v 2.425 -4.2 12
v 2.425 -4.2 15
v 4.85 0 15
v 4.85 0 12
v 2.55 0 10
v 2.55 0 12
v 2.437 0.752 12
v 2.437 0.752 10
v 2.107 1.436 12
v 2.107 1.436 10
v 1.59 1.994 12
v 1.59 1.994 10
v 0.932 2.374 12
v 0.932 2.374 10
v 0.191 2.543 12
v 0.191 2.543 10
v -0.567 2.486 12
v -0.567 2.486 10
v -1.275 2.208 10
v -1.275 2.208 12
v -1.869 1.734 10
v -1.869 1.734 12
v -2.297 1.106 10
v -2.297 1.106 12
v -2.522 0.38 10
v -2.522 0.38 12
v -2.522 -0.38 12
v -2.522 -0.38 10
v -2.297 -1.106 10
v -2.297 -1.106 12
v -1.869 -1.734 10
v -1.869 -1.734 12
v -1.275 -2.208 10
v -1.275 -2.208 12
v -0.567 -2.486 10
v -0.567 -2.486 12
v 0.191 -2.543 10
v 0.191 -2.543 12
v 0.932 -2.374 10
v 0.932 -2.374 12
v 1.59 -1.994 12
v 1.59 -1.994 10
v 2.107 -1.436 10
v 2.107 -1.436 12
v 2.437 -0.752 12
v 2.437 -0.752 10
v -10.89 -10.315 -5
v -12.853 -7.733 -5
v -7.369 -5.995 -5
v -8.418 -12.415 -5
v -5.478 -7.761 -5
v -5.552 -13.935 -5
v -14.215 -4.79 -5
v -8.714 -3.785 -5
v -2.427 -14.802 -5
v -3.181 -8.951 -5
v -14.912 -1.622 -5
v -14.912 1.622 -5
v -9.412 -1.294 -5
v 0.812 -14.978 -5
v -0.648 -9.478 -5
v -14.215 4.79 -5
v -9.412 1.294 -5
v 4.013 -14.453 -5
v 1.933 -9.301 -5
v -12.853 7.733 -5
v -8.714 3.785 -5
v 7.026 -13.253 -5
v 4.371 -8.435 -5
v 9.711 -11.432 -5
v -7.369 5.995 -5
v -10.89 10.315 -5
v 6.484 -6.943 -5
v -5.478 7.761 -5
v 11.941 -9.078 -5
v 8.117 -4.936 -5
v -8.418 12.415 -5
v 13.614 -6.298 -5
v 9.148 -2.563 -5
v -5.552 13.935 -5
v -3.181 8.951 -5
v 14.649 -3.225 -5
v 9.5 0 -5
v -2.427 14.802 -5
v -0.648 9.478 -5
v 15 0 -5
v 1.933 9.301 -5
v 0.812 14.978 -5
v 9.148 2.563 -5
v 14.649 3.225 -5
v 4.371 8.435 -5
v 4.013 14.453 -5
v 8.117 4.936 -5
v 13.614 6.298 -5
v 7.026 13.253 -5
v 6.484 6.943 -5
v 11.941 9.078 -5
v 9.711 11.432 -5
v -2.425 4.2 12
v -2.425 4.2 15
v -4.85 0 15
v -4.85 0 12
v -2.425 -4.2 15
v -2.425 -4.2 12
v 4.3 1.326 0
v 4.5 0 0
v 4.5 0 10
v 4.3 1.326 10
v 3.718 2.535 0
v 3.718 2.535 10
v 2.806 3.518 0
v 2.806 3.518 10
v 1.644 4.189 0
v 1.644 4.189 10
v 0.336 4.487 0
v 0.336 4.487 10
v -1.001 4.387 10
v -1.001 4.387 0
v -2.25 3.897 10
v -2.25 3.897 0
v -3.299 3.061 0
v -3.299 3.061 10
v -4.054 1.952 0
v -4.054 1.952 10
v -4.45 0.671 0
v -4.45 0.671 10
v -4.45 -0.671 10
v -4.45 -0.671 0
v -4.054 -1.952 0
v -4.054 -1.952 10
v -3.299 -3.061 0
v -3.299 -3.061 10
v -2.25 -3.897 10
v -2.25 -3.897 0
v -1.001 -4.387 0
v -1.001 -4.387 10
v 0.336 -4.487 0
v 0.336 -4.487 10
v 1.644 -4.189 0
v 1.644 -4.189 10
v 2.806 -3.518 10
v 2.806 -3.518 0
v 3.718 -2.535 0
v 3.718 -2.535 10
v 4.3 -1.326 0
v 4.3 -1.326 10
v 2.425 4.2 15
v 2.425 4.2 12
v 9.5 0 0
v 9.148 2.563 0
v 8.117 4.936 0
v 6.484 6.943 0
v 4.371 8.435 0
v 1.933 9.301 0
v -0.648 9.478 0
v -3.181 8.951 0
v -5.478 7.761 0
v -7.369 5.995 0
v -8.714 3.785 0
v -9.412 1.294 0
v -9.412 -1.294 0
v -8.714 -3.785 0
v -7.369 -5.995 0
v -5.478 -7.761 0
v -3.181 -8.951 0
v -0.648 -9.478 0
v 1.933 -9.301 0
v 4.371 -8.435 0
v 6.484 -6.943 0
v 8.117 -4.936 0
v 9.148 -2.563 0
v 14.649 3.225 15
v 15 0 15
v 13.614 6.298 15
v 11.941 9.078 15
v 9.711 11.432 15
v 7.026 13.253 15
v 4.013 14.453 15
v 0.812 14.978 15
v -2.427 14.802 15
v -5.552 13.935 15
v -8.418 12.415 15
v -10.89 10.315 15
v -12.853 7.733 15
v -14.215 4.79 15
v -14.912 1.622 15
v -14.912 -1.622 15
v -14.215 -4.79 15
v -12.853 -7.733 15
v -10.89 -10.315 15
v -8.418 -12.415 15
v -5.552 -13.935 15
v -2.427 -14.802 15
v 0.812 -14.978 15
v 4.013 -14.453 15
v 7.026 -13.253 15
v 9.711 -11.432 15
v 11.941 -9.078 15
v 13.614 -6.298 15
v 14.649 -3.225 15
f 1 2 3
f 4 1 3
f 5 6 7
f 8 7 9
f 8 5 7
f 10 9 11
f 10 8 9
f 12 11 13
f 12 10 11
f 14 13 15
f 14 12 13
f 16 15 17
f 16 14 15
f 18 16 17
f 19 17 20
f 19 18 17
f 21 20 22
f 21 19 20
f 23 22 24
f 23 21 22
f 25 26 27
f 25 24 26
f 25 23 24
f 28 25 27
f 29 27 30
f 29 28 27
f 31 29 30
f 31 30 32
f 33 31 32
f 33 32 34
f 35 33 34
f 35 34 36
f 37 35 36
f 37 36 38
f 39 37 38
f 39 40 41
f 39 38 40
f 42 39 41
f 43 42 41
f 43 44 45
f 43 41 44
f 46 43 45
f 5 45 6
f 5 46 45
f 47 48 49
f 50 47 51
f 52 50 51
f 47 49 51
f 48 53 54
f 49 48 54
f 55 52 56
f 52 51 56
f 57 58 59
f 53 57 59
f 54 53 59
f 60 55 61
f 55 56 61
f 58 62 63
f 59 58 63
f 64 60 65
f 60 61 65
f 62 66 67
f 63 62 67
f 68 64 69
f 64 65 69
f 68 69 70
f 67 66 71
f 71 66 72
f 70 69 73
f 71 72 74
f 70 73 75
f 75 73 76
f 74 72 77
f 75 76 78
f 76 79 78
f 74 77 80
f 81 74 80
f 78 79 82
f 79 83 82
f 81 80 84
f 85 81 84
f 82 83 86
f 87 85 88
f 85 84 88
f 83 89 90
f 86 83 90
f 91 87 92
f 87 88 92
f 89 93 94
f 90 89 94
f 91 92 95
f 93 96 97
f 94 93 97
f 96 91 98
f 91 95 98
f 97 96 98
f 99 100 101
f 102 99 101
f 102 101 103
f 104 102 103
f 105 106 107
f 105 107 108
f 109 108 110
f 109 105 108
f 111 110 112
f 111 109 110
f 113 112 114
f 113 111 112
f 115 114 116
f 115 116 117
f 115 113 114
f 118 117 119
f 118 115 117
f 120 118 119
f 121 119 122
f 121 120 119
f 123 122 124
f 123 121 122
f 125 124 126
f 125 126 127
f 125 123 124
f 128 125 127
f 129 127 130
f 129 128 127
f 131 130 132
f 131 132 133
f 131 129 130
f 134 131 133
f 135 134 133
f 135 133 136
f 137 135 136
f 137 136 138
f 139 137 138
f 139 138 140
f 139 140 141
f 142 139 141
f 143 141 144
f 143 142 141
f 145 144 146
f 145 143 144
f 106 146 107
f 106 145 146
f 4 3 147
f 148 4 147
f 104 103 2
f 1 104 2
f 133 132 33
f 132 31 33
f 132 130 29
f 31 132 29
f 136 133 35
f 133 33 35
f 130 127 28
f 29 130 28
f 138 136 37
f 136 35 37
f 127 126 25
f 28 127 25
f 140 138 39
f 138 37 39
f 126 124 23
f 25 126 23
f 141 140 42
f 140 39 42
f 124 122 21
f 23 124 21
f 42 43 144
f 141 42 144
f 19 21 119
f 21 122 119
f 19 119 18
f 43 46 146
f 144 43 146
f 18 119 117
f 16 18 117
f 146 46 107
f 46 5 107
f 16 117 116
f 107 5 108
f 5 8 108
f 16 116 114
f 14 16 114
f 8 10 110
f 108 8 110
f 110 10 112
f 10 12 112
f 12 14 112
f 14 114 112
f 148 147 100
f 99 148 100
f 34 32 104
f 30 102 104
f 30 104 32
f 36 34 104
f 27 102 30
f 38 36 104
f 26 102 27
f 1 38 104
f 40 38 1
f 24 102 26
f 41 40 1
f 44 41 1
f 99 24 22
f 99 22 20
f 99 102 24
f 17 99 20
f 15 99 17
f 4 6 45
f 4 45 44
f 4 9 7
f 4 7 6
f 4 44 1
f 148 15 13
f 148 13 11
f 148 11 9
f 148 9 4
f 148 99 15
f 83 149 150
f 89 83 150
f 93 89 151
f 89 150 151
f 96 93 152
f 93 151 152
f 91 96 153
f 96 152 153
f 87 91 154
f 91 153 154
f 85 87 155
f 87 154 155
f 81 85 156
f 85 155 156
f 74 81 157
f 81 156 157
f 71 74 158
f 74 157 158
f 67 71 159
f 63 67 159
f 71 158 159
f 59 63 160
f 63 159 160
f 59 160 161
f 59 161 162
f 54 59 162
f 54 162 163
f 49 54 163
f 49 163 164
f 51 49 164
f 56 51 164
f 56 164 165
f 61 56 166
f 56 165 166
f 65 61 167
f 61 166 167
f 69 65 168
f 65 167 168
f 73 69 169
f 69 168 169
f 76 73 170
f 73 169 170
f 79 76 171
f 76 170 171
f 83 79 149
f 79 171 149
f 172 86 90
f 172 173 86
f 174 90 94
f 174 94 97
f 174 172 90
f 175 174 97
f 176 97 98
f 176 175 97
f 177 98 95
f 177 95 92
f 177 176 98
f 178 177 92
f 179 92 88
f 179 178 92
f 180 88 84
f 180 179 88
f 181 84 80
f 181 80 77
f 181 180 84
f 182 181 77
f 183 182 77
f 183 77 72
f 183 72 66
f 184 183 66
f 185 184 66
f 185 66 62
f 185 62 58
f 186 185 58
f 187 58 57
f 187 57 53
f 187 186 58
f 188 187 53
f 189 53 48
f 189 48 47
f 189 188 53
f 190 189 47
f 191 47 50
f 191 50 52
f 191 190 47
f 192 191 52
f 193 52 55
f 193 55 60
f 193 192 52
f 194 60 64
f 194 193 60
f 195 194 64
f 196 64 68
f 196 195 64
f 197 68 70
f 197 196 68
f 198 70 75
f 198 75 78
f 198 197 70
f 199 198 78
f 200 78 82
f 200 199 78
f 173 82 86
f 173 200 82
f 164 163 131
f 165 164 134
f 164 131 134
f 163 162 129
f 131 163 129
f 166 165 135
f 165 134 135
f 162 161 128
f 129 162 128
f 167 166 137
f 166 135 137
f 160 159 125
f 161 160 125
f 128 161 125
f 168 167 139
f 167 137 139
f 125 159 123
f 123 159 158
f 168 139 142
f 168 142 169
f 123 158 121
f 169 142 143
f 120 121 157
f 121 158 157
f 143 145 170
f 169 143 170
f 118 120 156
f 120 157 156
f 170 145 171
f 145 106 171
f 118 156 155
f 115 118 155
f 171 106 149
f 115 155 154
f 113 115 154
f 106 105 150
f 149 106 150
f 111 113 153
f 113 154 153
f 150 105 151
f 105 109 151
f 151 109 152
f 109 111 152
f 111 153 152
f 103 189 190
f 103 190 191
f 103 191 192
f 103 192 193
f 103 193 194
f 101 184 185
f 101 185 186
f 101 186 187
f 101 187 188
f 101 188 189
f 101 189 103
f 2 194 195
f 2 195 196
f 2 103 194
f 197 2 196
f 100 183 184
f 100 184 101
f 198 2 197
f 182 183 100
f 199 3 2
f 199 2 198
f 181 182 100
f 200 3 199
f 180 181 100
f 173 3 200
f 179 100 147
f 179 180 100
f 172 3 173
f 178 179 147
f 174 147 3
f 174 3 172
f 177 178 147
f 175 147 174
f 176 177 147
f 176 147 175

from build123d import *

# Parameters (mm, degrees)
F0_R     = 15
F0_R_2   = 9.5
F0_R_3   = 4.5
F0_R_4   = 2.55
F1_DEPTH = 15
F3_DEPTH = 3
F4_DEPTH = 10
F5_DEPTH = 5


with BuildPart() as f1:
    # F0 (on Top) → F1 (new body)
    with BuildSketch(Plane.XY):
        Circle(F0_R)
        Circle(F0_R_2, mode=Mode.SUBTRACT)
        Circle(F0_R_2)
        Circle(F0_R_3, mode=Mode.SUBTRACT)
        Circle(F0_R_3)
        Circle(F0_R_4, mode=Mode.SUBTRACT)
    extrude(amount=F1_DEPTH)

    # F2 (on face) → F3 (cut)
    with BuildSketch(Plane.XY.offset(15)):
        Polygon((2.4248711306, -4.2), (4.8497422612, 0), (2.4248711306, 4.2), (-2.4248711306, 4.2), (-4.8497422612, 0), (-2.4248711306, -4.2), align=None)
    extrude(amount=-F3_DEPTH, mode=Mode.SUBTRACT)

    # F0 (on Top) → F4 (cut)
    with BuildSketch(Plane.XY):
        Circle(F0_R_3)
        Circle(F0_R_4, mode=Mode.SUBTRACT)
    extrude(amount=F4_DEPTH, mode=Mode.SUBTRACT)

    # F0 (on Top) → F5 (join)
    with BuildSketch(Plane.XY):
        Circle(F0_R)
        Circle(F0_R_2, mode=Mode.SUBTRACT)
    extrude(amount=-F5_DEPTH)


solid = f1.part
